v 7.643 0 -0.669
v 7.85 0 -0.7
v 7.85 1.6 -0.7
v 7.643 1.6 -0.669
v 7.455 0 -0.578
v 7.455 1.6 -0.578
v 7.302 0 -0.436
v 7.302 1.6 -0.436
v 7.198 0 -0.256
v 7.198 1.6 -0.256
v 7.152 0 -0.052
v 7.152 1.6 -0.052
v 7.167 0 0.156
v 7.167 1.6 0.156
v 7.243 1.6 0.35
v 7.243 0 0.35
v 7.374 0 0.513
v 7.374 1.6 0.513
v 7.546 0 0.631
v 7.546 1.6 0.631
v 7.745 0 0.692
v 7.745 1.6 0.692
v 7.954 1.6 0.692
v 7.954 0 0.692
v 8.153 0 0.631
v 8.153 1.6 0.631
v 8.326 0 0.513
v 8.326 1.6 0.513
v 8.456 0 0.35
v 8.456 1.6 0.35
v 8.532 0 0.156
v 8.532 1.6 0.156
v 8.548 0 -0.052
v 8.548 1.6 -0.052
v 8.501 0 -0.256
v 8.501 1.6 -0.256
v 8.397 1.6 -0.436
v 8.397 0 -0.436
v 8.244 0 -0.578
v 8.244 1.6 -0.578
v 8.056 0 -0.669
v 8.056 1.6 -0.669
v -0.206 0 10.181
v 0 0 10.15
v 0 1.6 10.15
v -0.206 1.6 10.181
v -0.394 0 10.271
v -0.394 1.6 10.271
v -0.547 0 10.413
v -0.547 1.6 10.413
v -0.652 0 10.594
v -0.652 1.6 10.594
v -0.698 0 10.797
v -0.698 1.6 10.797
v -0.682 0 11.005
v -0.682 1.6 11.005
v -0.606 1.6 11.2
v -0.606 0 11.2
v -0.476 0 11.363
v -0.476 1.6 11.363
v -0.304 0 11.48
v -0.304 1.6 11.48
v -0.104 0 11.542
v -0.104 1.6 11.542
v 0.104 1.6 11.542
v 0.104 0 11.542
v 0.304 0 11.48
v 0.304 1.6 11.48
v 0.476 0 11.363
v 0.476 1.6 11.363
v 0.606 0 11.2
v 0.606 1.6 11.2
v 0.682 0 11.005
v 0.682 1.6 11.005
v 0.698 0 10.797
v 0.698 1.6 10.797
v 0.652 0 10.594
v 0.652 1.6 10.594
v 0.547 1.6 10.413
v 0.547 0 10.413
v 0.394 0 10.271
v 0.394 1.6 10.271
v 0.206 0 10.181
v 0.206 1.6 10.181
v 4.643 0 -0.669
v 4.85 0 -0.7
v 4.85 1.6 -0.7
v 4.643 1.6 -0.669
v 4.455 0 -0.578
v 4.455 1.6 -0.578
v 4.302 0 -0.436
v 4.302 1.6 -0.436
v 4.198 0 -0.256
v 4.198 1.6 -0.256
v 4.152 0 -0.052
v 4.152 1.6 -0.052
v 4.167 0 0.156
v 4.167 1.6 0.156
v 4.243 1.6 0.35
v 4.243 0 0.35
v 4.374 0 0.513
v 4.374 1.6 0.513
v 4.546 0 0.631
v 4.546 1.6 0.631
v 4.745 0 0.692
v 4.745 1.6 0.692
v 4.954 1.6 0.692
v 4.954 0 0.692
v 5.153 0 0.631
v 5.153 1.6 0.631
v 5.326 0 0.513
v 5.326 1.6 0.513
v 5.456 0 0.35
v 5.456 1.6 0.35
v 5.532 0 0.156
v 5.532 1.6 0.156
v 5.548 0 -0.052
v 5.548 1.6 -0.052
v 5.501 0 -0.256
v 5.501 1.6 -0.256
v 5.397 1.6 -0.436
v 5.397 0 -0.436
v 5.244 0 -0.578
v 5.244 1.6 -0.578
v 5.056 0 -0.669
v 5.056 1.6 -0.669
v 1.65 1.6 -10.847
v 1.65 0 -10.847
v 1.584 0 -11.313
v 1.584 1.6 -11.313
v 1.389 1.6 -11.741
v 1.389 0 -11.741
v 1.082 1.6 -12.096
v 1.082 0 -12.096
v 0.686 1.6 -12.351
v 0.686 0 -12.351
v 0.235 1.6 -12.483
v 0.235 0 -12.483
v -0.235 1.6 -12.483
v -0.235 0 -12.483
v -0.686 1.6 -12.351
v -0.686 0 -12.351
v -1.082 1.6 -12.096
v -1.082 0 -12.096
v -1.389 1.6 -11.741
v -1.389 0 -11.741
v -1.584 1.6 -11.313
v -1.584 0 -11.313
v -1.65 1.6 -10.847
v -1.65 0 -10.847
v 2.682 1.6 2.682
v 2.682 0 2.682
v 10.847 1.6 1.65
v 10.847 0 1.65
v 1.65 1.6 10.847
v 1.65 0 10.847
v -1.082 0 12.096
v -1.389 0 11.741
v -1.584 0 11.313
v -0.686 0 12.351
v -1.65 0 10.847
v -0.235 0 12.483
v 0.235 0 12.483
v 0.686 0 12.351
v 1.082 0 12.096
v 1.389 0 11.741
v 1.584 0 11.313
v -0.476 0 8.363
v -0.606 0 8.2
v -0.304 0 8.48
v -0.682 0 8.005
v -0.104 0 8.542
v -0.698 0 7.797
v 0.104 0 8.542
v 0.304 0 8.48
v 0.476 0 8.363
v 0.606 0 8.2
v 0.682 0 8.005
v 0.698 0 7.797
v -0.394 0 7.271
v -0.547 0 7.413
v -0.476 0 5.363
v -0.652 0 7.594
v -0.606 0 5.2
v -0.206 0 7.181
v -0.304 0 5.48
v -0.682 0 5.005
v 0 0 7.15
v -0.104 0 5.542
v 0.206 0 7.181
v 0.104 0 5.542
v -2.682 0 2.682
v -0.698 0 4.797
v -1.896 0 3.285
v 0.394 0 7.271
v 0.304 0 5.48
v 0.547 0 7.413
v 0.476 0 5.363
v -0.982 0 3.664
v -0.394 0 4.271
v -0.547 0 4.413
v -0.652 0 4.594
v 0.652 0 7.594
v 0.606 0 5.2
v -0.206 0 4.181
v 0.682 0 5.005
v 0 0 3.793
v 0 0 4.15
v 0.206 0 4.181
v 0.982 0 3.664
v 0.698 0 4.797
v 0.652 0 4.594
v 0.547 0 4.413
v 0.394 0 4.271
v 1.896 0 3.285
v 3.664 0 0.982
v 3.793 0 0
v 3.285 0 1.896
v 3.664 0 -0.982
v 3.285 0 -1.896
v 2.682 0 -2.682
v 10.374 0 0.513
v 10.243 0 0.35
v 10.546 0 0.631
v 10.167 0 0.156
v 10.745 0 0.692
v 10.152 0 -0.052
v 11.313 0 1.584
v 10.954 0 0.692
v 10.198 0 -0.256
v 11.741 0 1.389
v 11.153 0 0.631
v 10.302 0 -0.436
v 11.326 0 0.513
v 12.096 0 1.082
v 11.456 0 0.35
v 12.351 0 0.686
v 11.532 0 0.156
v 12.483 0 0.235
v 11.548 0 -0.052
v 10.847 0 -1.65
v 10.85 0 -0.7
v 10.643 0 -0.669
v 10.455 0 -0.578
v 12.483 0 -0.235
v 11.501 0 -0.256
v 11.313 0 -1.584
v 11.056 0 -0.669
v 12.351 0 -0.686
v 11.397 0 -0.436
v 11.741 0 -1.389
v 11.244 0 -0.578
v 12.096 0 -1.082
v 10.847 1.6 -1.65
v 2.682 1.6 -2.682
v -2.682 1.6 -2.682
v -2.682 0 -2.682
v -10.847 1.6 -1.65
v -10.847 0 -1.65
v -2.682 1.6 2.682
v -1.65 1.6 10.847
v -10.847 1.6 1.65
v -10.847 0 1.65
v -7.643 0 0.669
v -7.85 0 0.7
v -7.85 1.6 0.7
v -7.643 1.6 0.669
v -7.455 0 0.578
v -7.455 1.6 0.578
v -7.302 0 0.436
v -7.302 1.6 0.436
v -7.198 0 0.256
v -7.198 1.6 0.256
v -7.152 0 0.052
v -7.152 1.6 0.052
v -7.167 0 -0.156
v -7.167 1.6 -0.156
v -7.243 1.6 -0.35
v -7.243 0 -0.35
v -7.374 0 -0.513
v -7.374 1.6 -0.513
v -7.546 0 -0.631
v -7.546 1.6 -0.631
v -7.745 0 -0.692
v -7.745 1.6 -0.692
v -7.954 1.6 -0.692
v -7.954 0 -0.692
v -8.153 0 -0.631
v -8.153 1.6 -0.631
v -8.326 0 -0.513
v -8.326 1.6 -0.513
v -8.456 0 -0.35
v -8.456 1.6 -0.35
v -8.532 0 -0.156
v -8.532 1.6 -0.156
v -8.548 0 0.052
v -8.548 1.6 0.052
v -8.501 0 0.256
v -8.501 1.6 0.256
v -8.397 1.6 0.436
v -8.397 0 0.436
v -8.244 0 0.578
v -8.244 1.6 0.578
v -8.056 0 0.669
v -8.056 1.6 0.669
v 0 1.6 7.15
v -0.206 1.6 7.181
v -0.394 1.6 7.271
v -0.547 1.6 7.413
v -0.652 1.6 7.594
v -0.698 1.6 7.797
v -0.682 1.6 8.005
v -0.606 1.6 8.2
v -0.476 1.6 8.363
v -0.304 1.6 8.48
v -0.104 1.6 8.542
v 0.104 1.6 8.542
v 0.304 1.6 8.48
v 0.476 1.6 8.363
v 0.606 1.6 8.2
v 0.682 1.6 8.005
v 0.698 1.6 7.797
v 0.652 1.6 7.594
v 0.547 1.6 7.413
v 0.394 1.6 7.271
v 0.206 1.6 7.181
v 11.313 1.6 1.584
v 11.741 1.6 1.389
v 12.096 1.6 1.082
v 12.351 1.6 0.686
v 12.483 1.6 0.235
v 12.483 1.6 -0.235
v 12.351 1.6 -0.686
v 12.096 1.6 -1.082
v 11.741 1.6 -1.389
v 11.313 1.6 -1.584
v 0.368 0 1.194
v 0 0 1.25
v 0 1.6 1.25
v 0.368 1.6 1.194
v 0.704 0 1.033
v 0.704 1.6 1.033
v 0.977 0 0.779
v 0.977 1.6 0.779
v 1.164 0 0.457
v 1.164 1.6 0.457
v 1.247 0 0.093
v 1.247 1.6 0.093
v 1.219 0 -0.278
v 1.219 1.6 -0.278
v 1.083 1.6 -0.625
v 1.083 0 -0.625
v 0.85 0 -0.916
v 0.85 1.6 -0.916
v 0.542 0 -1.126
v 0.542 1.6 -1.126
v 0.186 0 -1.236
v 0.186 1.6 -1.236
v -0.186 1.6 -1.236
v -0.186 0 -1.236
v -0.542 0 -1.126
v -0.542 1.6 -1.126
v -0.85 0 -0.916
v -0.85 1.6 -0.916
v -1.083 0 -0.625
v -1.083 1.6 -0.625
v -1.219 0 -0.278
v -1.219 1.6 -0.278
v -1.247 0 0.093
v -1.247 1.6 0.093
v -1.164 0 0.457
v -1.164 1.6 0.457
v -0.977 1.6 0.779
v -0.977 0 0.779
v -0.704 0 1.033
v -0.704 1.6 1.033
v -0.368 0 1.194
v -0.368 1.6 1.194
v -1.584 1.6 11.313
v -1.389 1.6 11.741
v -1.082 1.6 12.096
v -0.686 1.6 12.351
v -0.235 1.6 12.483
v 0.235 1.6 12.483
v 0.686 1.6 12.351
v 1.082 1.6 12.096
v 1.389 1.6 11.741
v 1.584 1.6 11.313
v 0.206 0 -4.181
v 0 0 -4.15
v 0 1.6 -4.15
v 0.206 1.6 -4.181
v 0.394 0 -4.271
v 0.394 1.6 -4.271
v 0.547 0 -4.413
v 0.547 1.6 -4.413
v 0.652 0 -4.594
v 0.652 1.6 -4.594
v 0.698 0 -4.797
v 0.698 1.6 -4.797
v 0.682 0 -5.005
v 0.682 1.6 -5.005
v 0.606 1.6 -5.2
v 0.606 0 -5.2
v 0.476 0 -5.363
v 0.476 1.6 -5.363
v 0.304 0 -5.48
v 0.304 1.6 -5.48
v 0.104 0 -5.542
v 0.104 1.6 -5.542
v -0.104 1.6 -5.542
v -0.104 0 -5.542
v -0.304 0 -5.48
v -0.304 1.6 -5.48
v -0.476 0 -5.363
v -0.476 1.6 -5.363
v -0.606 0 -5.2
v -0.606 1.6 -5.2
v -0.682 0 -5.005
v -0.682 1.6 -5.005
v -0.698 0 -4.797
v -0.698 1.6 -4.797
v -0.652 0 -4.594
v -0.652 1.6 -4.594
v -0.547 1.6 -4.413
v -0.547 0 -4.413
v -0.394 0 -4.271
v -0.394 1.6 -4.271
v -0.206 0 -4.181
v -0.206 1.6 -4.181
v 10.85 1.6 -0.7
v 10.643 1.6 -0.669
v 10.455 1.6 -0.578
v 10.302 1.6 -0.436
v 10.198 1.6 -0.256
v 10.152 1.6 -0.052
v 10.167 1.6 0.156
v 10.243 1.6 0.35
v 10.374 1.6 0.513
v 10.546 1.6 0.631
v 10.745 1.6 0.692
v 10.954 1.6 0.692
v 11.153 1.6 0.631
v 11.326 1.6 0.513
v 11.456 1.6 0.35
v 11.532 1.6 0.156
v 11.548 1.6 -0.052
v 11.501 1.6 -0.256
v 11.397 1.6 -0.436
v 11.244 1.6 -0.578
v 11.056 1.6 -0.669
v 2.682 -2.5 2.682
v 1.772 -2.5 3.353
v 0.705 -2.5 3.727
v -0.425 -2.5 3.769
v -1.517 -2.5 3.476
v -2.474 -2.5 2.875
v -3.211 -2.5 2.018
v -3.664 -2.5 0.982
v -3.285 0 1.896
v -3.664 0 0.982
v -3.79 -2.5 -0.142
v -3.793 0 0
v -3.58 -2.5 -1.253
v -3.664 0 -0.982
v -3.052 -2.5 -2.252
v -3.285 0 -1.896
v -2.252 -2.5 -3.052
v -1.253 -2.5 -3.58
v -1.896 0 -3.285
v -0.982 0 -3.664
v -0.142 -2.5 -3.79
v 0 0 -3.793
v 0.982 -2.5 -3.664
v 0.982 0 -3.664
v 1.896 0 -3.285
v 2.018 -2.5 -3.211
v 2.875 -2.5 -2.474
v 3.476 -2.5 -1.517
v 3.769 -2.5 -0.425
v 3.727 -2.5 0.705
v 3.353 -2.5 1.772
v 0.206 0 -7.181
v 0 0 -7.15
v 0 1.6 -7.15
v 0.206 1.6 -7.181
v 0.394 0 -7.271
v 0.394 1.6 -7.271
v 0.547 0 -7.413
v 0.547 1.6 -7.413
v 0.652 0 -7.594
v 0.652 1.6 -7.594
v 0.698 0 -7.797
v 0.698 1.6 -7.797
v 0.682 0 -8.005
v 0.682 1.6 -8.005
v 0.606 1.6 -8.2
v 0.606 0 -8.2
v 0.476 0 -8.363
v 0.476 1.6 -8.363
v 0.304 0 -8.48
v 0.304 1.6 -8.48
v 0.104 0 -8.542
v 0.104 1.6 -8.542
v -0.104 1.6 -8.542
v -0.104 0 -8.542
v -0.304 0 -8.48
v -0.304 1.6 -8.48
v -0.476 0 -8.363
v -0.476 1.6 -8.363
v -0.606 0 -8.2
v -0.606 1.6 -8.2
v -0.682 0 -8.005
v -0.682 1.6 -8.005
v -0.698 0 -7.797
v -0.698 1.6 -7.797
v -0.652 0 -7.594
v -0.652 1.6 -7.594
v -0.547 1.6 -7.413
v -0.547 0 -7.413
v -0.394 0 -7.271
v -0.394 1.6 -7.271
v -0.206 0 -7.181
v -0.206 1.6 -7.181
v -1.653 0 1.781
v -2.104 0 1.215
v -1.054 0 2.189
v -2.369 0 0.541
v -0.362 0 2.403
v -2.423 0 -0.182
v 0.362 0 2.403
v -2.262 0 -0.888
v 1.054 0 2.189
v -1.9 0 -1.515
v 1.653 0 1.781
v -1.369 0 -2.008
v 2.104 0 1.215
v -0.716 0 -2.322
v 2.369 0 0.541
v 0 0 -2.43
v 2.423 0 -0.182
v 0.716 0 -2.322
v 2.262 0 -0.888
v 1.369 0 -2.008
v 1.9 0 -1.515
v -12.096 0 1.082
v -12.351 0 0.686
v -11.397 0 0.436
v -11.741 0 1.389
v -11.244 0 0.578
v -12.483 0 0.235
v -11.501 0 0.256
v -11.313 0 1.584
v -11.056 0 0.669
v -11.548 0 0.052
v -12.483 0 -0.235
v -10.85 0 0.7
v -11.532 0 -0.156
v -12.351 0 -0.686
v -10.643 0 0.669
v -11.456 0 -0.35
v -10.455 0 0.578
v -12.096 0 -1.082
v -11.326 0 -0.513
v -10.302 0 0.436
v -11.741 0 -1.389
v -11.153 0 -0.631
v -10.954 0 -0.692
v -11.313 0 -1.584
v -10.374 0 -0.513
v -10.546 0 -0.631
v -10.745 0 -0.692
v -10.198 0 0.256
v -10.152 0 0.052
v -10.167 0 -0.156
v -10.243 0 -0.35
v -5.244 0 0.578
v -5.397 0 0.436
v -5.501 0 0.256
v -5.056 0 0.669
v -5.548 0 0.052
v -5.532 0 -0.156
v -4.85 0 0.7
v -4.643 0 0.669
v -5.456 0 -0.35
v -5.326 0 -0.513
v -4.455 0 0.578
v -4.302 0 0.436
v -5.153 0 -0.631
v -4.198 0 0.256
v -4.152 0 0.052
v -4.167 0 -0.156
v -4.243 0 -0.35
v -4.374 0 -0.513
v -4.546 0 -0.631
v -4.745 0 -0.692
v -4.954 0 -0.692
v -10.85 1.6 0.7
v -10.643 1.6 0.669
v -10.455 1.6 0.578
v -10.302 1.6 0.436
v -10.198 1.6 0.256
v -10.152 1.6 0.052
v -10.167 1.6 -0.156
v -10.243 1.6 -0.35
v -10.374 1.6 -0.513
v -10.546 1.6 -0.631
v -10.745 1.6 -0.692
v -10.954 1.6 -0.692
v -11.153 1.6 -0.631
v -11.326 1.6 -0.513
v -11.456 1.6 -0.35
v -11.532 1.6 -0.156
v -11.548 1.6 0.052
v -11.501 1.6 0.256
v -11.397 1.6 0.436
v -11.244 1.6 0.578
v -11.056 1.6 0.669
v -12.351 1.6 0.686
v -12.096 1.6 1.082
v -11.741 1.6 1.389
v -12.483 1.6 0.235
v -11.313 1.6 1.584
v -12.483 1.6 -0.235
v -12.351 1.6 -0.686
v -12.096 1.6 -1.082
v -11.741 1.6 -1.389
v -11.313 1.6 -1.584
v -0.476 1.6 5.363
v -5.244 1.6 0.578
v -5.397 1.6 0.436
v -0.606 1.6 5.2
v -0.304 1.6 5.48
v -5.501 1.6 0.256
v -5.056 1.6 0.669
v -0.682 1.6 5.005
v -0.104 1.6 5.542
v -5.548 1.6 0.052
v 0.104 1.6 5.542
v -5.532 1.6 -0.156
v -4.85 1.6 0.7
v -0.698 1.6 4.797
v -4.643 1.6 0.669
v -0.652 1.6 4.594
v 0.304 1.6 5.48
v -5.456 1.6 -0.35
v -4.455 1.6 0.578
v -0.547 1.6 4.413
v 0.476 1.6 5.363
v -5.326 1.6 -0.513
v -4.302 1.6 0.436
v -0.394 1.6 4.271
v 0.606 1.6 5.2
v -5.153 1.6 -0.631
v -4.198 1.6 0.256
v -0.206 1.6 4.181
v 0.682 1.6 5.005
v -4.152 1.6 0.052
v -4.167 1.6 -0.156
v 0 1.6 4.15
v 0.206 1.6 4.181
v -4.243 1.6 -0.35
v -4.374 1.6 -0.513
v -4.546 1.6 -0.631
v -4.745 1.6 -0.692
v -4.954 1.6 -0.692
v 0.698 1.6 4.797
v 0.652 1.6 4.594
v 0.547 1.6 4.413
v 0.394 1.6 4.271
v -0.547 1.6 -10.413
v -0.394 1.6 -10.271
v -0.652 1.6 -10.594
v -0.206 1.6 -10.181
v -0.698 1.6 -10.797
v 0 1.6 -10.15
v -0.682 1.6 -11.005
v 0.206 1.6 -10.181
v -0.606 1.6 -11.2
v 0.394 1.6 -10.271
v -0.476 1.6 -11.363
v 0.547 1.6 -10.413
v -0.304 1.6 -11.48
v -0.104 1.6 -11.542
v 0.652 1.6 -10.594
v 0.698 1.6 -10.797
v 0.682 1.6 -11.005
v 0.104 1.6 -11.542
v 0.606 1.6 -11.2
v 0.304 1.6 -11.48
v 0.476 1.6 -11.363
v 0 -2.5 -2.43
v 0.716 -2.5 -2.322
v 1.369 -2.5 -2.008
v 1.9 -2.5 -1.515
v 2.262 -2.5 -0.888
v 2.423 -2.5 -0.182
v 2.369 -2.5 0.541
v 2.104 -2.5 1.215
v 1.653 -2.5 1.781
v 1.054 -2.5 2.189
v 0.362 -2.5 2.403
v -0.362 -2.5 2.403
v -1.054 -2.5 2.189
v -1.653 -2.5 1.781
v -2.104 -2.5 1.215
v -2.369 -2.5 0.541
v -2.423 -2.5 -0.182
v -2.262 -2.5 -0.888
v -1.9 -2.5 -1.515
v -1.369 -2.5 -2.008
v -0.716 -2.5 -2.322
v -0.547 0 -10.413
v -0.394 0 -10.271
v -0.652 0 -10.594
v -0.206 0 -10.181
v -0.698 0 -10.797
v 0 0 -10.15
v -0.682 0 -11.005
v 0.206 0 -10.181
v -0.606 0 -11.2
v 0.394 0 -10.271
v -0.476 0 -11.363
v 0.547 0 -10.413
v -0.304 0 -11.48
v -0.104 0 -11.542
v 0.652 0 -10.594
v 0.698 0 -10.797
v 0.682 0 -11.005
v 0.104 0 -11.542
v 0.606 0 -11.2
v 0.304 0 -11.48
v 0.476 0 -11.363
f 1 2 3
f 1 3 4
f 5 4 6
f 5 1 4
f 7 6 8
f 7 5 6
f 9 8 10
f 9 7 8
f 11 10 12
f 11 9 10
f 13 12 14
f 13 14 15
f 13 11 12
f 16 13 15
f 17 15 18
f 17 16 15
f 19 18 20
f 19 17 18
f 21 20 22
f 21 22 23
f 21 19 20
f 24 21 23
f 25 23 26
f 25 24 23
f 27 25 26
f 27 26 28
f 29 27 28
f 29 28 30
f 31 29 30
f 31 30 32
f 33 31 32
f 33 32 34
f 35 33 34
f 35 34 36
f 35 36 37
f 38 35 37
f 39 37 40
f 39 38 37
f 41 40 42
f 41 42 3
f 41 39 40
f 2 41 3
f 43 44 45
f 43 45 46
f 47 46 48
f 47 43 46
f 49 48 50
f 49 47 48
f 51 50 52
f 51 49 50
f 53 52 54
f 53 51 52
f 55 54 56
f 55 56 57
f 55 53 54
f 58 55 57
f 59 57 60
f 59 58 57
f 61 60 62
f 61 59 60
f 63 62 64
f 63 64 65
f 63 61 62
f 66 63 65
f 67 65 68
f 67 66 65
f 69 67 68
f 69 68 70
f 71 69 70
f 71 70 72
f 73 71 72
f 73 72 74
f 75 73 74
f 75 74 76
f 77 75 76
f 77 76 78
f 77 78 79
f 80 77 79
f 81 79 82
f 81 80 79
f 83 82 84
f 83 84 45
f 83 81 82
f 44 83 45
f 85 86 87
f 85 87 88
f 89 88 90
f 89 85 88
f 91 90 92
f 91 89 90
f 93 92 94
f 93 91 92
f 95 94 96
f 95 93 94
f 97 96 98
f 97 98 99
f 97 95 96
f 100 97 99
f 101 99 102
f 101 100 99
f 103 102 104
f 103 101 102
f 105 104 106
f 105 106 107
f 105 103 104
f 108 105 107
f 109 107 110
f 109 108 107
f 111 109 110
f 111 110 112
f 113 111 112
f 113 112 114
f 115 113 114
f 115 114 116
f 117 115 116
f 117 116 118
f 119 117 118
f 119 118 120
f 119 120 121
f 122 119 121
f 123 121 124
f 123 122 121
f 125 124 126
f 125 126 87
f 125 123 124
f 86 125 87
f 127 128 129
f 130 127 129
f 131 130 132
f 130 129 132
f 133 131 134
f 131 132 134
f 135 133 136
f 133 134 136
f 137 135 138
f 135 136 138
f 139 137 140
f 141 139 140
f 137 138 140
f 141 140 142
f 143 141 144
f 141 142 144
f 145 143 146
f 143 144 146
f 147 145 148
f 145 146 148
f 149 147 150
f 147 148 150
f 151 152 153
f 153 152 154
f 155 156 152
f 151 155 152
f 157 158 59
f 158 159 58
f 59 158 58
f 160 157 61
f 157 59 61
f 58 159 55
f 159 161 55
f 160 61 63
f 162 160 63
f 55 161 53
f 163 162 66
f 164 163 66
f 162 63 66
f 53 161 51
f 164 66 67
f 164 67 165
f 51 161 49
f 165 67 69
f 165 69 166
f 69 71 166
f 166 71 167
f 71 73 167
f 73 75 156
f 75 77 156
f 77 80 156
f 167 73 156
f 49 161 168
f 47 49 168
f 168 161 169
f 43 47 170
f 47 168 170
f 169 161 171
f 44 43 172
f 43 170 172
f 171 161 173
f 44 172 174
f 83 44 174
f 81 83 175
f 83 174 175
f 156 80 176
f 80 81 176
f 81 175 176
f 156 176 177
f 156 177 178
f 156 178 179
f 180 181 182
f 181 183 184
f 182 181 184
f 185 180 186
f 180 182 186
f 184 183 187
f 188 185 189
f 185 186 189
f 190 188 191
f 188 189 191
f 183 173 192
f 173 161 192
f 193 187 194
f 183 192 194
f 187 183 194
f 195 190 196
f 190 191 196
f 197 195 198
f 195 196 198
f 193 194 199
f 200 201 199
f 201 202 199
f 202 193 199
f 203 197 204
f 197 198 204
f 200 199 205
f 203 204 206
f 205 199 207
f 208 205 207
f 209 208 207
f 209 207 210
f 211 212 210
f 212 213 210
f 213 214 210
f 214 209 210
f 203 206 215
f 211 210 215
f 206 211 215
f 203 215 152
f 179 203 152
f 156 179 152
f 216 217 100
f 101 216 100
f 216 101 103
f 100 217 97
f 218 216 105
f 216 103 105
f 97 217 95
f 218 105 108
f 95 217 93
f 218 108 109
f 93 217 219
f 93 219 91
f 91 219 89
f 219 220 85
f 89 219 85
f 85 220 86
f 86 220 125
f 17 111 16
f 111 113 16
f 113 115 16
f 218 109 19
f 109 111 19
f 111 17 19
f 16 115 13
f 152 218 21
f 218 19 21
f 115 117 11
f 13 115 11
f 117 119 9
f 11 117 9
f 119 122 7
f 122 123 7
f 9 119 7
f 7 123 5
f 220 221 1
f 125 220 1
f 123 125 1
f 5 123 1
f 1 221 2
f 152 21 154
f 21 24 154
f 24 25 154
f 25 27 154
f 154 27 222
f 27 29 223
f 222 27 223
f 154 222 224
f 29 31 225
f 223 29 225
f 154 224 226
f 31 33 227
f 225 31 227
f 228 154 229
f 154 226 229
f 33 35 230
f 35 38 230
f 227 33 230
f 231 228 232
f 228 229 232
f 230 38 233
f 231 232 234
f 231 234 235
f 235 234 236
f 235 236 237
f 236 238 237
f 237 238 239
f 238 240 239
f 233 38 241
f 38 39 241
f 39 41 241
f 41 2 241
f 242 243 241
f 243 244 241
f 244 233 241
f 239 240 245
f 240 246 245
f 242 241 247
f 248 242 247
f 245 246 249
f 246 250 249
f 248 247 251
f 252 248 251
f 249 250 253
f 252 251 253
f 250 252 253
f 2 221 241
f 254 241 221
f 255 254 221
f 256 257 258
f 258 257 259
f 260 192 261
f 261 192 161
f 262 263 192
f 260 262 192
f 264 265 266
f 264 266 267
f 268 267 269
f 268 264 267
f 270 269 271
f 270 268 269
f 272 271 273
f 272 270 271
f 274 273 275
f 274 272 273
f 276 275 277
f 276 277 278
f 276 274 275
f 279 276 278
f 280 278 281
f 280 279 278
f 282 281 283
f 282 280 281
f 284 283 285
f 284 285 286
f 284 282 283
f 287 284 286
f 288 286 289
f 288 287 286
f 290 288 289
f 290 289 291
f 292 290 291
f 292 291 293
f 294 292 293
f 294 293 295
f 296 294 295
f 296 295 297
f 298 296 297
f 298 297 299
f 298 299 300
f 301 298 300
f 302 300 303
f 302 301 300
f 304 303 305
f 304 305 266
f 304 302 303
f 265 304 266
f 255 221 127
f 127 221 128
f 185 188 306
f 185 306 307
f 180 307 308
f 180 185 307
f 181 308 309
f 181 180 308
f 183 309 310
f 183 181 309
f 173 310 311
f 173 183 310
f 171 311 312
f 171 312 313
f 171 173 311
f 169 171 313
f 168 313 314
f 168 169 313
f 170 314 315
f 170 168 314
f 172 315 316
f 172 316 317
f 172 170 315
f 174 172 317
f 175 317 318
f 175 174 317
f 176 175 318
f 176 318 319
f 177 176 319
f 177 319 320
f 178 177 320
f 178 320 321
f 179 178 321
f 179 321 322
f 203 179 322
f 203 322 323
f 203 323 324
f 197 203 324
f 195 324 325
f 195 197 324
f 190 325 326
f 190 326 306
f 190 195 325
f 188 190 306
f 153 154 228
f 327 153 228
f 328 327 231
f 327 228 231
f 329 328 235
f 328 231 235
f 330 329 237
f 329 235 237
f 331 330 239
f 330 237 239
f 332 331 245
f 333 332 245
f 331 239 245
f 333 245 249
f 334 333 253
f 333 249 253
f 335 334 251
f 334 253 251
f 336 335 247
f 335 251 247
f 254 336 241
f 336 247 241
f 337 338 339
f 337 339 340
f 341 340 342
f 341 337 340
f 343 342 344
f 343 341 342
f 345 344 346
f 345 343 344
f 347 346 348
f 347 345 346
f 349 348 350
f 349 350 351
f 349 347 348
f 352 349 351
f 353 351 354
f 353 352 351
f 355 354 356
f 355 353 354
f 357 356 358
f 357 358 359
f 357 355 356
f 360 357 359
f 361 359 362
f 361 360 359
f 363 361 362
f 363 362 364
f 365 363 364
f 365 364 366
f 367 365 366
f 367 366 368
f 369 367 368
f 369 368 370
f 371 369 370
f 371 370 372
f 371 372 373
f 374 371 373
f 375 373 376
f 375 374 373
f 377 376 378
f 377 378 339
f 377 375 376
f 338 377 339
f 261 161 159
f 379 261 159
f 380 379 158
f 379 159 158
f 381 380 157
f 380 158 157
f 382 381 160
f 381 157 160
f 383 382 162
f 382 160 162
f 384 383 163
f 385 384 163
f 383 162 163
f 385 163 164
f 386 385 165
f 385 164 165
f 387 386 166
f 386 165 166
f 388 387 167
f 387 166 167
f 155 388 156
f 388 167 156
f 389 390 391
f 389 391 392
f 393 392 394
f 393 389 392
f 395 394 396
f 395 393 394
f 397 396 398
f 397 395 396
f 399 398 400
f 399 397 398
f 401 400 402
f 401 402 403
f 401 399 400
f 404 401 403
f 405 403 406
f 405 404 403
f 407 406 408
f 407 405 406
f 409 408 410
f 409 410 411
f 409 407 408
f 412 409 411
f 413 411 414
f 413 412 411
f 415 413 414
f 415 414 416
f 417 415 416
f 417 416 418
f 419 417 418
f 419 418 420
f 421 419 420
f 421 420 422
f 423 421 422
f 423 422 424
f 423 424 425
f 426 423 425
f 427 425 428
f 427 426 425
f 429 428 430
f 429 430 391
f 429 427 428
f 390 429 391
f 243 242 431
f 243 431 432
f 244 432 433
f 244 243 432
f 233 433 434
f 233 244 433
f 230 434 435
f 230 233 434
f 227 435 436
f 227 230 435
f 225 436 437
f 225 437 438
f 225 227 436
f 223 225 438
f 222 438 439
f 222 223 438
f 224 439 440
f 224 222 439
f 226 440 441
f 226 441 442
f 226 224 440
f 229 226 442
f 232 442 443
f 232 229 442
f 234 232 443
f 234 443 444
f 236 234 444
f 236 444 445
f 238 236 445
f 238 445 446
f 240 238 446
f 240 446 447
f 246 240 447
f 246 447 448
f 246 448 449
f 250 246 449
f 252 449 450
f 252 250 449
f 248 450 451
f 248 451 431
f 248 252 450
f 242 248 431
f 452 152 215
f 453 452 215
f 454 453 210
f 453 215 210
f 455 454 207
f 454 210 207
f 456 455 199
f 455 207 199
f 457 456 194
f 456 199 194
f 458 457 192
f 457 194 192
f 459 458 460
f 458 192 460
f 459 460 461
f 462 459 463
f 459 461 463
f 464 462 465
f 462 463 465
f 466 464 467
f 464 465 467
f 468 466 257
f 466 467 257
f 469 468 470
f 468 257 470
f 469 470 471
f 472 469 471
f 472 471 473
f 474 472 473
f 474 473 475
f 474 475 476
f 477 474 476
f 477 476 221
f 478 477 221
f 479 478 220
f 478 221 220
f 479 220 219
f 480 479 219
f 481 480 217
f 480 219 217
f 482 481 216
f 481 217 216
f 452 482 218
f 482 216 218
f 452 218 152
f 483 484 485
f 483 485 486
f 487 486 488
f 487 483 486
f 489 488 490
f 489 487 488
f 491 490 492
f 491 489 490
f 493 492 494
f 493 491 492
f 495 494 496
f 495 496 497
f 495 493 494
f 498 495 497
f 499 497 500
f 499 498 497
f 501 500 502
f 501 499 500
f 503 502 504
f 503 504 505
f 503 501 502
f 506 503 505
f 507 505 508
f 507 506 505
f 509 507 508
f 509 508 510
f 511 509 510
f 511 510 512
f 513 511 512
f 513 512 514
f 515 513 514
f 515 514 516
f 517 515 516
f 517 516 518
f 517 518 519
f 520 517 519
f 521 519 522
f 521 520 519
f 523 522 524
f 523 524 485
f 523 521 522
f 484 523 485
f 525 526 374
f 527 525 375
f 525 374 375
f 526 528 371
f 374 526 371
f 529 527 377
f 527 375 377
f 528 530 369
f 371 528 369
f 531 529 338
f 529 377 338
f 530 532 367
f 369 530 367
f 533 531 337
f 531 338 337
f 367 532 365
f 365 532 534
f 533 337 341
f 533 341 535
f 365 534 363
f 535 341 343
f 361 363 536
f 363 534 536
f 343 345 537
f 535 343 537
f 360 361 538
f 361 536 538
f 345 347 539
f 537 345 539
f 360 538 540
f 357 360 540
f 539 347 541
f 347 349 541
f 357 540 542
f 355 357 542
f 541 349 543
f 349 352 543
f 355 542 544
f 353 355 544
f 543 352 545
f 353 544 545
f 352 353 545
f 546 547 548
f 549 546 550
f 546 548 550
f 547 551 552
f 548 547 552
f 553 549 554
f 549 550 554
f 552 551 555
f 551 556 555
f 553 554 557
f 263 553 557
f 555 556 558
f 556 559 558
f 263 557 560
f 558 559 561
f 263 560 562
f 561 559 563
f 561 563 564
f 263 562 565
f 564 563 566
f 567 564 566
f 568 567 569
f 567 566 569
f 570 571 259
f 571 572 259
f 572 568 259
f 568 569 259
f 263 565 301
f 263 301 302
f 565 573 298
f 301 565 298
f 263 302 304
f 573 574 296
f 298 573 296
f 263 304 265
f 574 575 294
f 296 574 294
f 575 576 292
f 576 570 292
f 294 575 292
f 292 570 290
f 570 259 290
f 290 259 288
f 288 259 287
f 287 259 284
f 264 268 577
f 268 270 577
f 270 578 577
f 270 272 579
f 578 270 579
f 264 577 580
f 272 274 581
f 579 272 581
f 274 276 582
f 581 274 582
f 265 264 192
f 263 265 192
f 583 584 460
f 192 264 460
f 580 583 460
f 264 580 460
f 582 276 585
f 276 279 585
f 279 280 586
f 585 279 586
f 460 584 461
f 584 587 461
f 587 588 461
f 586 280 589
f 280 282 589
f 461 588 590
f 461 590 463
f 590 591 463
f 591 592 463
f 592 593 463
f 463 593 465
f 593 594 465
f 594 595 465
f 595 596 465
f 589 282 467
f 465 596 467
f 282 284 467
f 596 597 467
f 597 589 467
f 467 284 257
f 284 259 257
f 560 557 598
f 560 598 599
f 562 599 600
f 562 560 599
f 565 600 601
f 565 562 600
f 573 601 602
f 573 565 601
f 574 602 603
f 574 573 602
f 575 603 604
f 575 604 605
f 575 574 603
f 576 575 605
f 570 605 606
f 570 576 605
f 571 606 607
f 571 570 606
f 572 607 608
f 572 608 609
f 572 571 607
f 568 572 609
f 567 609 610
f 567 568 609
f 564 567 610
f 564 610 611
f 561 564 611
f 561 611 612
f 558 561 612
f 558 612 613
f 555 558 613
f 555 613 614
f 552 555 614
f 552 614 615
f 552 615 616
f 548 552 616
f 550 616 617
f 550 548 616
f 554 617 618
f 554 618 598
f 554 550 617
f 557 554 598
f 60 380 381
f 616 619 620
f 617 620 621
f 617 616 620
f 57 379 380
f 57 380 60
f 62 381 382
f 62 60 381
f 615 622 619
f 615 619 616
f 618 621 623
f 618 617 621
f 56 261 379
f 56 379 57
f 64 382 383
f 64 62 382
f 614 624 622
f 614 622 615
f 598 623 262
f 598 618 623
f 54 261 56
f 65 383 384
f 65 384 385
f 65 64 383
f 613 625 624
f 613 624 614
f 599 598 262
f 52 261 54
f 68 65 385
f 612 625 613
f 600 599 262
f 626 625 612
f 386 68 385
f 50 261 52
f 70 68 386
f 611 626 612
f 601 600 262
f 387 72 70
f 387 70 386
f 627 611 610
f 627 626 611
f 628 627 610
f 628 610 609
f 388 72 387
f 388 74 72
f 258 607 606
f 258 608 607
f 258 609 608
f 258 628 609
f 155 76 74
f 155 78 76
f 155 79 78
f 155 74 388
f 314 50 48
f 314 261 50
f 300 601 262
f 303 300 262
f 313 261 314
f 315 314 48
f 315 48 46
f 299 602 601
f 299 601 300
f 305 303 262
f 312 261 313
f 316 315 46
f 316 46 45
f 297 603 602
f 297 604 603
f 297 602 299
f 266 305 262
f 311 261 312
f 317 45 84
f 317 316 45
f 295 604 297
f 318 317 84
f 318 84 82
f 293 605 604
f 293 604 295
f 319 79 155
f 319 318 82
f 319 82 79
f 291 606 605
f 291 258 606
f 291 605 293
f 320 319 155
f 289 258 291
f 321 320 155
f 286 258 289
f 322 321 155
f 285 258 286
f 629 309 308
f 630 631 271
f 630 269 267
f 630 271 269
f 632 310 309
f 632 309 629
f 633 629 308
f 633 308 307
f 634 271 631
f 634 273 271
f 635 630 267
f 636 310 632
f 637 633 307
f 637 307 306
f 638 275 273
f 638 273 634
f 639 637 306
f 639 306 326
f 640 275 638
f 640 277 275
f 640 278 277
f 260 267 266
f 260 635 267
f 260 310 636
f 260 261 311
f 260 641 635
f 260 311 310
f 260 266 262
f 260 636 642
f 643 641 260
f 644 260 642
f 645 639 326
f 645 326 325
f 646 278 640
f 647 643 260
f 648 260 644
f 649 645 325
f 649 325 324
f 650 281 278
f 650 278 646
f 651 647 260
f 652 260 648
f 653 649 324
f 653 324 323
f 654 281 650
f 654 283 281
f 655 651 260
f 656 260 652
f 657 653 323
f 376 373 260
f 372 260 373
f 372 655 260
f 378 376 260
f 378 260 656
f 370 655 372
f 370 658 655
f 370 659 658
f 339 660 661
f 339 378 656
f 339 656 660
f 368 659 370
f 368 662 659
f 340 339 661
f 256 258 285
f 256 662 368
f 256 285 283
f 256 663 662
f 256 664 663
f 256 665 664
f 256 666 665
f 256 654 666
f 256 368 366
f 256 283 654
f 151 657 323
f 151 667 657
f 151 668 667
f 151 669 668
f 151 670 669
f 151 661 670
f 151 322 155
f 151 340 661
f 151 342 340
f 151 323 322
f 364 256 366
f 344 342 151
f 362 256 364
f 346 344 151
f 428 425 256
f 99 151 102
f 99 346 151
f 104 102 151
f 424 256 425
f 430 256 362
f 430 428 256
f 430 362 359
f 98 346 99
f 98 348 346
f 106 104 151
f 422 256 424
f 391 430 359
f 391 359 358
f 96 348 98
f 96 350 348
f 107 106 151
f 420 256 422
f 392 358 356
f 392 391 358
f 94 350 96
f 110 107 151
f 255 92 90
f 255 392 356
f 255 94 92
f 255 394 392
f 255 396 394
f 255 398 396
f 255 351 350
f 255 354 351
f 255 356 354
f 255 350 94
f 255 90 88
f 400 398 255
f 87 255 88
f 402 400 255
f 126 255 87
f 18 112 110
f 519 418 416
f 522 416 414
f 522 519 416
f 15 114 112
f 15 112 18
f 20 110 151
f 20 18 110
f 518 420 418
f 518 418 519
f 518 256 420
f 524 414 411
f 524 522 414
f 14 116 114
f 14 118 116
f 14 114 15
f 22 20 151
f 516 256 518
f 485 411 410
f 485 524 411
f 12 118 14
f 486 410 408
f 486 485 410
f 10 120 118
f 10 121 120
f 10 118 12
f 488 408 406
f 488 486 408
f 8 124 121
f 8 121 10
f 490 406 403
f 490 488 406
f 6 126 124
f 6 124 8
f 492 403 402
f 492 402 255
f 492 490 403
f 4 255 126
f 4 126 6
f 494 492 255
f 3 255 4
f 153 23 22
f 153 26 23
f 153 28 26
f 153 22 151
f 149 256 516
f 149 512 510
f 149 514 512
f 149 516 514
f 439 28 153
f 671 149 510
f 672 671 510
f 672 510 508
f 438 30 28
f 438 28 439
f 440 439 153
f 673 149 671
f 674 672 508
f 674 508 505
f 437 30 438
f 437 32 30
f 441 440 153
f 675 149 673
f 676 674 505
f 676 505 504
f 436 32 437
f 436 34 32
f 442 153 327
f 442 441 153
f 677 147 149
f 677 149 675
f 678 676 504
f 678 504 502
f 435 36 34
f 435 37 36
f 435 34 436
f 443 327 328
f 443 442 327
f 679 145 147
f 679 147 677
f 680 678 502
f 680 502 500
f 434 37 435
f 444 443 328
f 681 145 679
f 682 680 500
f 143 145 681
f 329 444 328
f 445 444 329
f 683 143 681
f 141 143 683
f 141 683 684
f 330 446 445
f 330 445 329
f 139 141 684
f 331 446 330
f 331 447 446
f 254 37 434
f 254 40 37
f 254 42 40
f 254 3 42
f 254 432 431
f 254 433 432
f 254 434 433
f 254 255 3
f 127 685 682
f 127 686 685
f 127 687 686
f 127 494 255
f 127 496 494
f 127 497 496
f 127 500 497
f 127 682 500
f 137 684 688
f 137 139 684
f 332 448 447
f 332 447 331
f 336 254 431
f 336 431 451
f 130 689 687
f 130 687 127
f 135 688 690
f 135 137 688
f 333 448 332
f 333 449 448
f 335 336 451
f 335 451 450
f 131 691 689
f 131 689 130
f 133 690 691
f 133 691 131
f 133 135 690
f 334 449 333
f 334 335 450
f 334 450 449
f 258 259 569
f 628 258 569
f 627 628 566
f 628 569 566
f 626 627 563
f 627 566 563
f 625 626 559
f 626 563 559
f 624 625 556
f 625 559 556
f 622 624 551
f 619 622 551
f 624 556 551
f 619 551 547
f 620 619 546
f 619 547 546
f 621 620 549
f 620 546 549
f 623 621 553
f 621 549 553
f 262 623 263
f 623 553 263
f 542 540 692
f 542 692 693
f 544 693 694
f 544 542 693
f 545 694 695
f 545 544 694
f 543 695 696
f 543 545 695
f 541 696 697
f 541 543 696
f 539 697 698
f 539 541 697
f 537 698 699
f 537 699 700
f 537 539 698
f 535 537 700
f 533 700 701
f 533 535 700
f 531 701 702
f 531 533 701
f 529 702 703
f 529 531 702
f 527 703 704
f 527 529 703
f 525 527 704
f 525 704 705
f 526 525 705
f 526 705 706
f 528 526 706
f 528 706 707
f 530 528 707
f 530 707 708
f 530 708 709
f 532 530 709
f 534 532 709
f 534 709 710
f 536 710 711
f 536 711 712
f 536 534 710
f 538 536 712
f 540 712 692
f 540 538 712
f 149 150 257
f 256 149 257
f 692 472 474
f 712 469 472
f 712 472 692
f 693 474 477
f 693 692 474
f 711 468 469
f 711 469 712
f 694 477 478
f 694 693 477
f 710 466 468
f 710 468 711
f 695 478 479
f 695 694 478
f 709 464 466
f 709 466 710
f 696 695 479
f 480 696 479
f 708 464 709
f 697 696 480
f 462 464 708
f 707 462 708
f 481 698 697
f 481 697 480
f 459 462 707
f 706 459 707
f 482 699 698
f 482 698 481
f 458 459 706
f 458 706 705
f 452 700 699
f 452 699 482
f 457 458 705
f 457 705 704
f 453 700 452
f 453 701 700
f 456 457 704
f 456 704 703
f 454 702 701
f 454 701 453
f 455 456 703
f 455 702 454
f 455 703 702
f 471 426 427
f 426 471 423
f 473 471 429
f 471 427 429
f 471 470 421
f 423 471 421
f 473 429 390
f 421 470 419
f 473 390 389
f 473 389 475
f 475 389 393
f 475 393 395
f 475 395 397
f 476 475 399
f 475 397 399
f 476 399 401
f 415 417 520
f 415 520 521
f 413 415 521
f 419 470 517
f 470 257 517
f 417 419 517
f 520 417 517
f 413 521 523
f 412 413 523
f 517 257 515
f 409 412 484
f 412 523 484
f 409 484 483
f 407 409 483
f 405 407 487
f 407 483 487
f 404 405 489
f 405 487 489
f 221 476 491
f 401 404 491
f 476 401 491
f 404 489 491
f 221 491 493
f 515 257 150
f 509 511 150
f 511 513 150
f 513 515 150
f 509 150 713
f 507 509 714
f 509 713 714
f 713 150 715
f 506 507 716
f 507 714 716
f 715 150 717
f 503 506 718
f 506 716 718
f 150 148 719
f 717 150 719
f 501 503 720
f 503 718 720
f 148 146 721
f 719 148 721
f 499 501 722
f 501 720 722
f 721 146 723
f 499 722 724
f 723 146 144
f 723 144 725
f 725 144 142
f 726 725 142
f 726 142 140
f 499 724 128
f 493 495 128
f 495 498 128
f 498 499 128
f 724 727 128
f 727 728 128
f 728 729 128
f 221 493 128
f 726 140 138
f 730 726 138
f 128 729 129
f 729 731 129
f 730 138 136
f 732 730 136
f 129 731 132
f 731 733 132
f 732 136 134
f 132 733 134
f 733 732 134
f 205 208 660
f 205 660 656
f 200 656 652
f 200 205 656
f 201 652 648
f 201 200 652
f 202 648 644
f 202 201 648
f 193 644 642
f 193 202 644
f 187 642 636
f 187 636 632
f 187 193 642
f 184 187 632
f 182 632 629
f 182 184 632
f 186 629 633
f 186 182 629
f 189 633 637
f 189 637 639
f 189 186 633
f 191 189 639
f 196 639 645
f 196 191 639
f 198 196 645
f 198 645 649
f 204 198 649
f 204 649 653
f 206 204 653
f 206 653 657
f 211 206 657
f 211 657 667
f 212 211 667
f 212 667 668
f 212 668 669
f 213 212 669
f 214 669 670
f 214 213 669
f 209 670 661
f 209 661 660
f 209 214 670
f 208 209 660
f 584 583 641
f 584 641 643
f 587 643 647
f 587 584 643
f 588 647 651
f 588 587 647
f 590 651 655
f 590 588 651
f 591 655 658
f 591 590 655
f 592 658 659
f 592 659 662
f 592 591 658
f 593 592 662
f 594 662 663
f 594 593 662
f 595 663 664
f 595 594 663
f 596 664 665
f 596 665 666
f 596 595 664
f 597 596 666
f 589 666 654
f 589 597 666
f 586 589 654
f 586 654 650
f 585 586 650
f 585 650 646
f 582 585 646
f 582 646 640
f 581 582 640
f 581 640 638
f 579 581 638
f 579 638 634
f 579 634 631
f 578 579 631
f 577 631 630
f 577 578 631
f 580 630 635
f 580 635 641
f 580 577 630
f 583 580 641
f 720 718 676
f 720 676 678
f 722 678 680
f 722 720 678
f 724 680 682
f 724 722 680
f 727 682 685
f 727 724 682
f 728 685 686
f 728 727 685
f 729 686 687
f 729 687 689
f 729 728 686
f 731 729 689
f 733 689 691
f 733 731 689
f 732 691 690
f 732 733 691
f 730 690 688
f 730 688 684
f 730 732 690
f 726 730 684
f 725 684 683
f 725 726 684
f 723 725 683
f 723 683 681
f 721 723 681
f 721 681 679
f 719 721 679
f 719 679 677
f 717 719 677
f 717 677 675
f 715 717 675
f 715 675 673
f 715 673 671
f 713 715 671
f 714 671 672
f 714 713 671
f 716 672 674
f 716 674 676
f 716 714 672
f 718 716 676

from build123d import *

# Parameters (mm, degrees)
SKETCH1_R           = 0.7
SKETCH1_R_2         = 1.25
BOSS_EXTRUDE1_DEPTH = 1.6
SKETCH2_R           = 3.792840445
SKETCH2_R_2         = 2.43
BOSS_EXTRUDE2_DEPTH = 2.5


with BuildPart() as part:
    # Sketch1 → Boss-Extrude1 (new body)
    with BuildSketch(Plane(origin=(0, 0, 0), x_dir=(1, 0, 0), z_dir=(0, 1, 0))):
        with BuildLine():
            Line((-10.84721718, -1.650301895), (-2.681943198, -2.681943198))
            Line((-2.681943198, -2.681943198), (-1.650301895, -10.84721718))
            ThreePointArc((-1.650301895, -10.84721718), (0, -12.5), (1.650301895, -10.84721718))
            Line((1.650301895, -10.84721718), (2.681943198, -2.681943198))
            Line((2.681943198, -2.681943198), (10.84721718, -1.650301895))
            ThreePointArc((10.84721718, -1.650301895), (12.5, 0), (10.84721718, 1.650301895))
            Line((10.84721718, 1.650301895), (2.681943198, 2.681943198))
            Line((2.681943198, 2.681943198), (1.650301895, 10.84721718))
            ThreePointArc((1.650301895, 10.84721718), (0, 12.5), (-1.650301895, 10.84721718))
            Line((-1.650301895, 10.84721718), (-2.681943198, 2.681943198))
            Line((-2.681943198, 2.681943198), (-10.84721718, 1.650301895))
            ThreePointArc((-10.84721718, 1.650301895), (-12.5, 0), (-10.84721718, -1.650301895))
        make_face()
        with Locations(Location((0, 4.849696243, 0), (0, 0, 270))):
            Circle(SKETCH1_R, mode=Mode.SUBTRACT)
        with Locations(Location((0, 7.849696243, 0), (0, 0, 270))):
            Circle(SKETCH1_R, mode=Mode.SUBTRACT)
        with Locations(Location((0, 10.849696243, 0), (0, 0, 270))):
            Circle(SKETCH1_R, mode=Mode.SUBTRACT)
        with Locations(Location((0, -4.849696243, 0), (0, 0, 90))):
            Circle(SKETCH1_R, mode=Mode.SUBTRACT)
        with Locations(Location((0, -7.849696243, 0), (0, 0, 90))):
            Circle(SKETCH1_R, mode=Mode.SUBTRACT)
        with Locations(Location((0, -10.849696243, 0), (0, 0, 90))):
            Circle(SKETCH1_R, mode=Mode.SUBTRACT)
        with Locations(Location((-10.849696243, 0, 0), (0, 0, 270))):
            Circle(SKETCH1_R, mode=Mode.SUBTRACT)
        with Locations(Location((-7.849696243, 0, 0), (0, 0, 270))):
            Circle(SKETCH1_R, mode=Mode.SUBTRACT)
        with Locations(Location((-4.849696243, 0, 0), (0, 0, 270))):
            Circle(SKETCH1_R, mode=Mode.SUBTRACT)
        with Locations(Location((10.849696243, 0, 0), (0, 0, 90))):
            Circle(SKETCH1_R, mode=Mode.SUBTRACT)
        with Locations(Location((4.849696243, 0, 0), (0, 0, 90))):
            Circle(SKETCH1_R, mode=Mode.SUBTRACT)
        with Locations(Location((7.849696243, 0, 0), (0, 0, 90))):
            Circle(SKETCH1_R, mode=Mode.SUBTRACT)
        with Locations(Location((0, 0, 0), (0, 0, 270))):
            Circle(SKETCH1_R_2, mode=Mode.SUBTRACT)
    extrude(amount=BOSS_EXTRUDE1_DEPTH)

    # Sketch2 → Boss-Extrude2 (add)
    with BuildSketch(Plane.XZ):
        with Locations(Location((0, 0, 0), (0, 0, 45))):
            Circle(SKETCH2_R)
        with Locations(Location((0, 0, 0), (0, 0, 270))):
            Circle(SKETCH2_R_2, mode=Mode.SUBTRACT)
    extrude(amount=BOSS_EXTRUDE2_DEPTH)


solid = part.part
